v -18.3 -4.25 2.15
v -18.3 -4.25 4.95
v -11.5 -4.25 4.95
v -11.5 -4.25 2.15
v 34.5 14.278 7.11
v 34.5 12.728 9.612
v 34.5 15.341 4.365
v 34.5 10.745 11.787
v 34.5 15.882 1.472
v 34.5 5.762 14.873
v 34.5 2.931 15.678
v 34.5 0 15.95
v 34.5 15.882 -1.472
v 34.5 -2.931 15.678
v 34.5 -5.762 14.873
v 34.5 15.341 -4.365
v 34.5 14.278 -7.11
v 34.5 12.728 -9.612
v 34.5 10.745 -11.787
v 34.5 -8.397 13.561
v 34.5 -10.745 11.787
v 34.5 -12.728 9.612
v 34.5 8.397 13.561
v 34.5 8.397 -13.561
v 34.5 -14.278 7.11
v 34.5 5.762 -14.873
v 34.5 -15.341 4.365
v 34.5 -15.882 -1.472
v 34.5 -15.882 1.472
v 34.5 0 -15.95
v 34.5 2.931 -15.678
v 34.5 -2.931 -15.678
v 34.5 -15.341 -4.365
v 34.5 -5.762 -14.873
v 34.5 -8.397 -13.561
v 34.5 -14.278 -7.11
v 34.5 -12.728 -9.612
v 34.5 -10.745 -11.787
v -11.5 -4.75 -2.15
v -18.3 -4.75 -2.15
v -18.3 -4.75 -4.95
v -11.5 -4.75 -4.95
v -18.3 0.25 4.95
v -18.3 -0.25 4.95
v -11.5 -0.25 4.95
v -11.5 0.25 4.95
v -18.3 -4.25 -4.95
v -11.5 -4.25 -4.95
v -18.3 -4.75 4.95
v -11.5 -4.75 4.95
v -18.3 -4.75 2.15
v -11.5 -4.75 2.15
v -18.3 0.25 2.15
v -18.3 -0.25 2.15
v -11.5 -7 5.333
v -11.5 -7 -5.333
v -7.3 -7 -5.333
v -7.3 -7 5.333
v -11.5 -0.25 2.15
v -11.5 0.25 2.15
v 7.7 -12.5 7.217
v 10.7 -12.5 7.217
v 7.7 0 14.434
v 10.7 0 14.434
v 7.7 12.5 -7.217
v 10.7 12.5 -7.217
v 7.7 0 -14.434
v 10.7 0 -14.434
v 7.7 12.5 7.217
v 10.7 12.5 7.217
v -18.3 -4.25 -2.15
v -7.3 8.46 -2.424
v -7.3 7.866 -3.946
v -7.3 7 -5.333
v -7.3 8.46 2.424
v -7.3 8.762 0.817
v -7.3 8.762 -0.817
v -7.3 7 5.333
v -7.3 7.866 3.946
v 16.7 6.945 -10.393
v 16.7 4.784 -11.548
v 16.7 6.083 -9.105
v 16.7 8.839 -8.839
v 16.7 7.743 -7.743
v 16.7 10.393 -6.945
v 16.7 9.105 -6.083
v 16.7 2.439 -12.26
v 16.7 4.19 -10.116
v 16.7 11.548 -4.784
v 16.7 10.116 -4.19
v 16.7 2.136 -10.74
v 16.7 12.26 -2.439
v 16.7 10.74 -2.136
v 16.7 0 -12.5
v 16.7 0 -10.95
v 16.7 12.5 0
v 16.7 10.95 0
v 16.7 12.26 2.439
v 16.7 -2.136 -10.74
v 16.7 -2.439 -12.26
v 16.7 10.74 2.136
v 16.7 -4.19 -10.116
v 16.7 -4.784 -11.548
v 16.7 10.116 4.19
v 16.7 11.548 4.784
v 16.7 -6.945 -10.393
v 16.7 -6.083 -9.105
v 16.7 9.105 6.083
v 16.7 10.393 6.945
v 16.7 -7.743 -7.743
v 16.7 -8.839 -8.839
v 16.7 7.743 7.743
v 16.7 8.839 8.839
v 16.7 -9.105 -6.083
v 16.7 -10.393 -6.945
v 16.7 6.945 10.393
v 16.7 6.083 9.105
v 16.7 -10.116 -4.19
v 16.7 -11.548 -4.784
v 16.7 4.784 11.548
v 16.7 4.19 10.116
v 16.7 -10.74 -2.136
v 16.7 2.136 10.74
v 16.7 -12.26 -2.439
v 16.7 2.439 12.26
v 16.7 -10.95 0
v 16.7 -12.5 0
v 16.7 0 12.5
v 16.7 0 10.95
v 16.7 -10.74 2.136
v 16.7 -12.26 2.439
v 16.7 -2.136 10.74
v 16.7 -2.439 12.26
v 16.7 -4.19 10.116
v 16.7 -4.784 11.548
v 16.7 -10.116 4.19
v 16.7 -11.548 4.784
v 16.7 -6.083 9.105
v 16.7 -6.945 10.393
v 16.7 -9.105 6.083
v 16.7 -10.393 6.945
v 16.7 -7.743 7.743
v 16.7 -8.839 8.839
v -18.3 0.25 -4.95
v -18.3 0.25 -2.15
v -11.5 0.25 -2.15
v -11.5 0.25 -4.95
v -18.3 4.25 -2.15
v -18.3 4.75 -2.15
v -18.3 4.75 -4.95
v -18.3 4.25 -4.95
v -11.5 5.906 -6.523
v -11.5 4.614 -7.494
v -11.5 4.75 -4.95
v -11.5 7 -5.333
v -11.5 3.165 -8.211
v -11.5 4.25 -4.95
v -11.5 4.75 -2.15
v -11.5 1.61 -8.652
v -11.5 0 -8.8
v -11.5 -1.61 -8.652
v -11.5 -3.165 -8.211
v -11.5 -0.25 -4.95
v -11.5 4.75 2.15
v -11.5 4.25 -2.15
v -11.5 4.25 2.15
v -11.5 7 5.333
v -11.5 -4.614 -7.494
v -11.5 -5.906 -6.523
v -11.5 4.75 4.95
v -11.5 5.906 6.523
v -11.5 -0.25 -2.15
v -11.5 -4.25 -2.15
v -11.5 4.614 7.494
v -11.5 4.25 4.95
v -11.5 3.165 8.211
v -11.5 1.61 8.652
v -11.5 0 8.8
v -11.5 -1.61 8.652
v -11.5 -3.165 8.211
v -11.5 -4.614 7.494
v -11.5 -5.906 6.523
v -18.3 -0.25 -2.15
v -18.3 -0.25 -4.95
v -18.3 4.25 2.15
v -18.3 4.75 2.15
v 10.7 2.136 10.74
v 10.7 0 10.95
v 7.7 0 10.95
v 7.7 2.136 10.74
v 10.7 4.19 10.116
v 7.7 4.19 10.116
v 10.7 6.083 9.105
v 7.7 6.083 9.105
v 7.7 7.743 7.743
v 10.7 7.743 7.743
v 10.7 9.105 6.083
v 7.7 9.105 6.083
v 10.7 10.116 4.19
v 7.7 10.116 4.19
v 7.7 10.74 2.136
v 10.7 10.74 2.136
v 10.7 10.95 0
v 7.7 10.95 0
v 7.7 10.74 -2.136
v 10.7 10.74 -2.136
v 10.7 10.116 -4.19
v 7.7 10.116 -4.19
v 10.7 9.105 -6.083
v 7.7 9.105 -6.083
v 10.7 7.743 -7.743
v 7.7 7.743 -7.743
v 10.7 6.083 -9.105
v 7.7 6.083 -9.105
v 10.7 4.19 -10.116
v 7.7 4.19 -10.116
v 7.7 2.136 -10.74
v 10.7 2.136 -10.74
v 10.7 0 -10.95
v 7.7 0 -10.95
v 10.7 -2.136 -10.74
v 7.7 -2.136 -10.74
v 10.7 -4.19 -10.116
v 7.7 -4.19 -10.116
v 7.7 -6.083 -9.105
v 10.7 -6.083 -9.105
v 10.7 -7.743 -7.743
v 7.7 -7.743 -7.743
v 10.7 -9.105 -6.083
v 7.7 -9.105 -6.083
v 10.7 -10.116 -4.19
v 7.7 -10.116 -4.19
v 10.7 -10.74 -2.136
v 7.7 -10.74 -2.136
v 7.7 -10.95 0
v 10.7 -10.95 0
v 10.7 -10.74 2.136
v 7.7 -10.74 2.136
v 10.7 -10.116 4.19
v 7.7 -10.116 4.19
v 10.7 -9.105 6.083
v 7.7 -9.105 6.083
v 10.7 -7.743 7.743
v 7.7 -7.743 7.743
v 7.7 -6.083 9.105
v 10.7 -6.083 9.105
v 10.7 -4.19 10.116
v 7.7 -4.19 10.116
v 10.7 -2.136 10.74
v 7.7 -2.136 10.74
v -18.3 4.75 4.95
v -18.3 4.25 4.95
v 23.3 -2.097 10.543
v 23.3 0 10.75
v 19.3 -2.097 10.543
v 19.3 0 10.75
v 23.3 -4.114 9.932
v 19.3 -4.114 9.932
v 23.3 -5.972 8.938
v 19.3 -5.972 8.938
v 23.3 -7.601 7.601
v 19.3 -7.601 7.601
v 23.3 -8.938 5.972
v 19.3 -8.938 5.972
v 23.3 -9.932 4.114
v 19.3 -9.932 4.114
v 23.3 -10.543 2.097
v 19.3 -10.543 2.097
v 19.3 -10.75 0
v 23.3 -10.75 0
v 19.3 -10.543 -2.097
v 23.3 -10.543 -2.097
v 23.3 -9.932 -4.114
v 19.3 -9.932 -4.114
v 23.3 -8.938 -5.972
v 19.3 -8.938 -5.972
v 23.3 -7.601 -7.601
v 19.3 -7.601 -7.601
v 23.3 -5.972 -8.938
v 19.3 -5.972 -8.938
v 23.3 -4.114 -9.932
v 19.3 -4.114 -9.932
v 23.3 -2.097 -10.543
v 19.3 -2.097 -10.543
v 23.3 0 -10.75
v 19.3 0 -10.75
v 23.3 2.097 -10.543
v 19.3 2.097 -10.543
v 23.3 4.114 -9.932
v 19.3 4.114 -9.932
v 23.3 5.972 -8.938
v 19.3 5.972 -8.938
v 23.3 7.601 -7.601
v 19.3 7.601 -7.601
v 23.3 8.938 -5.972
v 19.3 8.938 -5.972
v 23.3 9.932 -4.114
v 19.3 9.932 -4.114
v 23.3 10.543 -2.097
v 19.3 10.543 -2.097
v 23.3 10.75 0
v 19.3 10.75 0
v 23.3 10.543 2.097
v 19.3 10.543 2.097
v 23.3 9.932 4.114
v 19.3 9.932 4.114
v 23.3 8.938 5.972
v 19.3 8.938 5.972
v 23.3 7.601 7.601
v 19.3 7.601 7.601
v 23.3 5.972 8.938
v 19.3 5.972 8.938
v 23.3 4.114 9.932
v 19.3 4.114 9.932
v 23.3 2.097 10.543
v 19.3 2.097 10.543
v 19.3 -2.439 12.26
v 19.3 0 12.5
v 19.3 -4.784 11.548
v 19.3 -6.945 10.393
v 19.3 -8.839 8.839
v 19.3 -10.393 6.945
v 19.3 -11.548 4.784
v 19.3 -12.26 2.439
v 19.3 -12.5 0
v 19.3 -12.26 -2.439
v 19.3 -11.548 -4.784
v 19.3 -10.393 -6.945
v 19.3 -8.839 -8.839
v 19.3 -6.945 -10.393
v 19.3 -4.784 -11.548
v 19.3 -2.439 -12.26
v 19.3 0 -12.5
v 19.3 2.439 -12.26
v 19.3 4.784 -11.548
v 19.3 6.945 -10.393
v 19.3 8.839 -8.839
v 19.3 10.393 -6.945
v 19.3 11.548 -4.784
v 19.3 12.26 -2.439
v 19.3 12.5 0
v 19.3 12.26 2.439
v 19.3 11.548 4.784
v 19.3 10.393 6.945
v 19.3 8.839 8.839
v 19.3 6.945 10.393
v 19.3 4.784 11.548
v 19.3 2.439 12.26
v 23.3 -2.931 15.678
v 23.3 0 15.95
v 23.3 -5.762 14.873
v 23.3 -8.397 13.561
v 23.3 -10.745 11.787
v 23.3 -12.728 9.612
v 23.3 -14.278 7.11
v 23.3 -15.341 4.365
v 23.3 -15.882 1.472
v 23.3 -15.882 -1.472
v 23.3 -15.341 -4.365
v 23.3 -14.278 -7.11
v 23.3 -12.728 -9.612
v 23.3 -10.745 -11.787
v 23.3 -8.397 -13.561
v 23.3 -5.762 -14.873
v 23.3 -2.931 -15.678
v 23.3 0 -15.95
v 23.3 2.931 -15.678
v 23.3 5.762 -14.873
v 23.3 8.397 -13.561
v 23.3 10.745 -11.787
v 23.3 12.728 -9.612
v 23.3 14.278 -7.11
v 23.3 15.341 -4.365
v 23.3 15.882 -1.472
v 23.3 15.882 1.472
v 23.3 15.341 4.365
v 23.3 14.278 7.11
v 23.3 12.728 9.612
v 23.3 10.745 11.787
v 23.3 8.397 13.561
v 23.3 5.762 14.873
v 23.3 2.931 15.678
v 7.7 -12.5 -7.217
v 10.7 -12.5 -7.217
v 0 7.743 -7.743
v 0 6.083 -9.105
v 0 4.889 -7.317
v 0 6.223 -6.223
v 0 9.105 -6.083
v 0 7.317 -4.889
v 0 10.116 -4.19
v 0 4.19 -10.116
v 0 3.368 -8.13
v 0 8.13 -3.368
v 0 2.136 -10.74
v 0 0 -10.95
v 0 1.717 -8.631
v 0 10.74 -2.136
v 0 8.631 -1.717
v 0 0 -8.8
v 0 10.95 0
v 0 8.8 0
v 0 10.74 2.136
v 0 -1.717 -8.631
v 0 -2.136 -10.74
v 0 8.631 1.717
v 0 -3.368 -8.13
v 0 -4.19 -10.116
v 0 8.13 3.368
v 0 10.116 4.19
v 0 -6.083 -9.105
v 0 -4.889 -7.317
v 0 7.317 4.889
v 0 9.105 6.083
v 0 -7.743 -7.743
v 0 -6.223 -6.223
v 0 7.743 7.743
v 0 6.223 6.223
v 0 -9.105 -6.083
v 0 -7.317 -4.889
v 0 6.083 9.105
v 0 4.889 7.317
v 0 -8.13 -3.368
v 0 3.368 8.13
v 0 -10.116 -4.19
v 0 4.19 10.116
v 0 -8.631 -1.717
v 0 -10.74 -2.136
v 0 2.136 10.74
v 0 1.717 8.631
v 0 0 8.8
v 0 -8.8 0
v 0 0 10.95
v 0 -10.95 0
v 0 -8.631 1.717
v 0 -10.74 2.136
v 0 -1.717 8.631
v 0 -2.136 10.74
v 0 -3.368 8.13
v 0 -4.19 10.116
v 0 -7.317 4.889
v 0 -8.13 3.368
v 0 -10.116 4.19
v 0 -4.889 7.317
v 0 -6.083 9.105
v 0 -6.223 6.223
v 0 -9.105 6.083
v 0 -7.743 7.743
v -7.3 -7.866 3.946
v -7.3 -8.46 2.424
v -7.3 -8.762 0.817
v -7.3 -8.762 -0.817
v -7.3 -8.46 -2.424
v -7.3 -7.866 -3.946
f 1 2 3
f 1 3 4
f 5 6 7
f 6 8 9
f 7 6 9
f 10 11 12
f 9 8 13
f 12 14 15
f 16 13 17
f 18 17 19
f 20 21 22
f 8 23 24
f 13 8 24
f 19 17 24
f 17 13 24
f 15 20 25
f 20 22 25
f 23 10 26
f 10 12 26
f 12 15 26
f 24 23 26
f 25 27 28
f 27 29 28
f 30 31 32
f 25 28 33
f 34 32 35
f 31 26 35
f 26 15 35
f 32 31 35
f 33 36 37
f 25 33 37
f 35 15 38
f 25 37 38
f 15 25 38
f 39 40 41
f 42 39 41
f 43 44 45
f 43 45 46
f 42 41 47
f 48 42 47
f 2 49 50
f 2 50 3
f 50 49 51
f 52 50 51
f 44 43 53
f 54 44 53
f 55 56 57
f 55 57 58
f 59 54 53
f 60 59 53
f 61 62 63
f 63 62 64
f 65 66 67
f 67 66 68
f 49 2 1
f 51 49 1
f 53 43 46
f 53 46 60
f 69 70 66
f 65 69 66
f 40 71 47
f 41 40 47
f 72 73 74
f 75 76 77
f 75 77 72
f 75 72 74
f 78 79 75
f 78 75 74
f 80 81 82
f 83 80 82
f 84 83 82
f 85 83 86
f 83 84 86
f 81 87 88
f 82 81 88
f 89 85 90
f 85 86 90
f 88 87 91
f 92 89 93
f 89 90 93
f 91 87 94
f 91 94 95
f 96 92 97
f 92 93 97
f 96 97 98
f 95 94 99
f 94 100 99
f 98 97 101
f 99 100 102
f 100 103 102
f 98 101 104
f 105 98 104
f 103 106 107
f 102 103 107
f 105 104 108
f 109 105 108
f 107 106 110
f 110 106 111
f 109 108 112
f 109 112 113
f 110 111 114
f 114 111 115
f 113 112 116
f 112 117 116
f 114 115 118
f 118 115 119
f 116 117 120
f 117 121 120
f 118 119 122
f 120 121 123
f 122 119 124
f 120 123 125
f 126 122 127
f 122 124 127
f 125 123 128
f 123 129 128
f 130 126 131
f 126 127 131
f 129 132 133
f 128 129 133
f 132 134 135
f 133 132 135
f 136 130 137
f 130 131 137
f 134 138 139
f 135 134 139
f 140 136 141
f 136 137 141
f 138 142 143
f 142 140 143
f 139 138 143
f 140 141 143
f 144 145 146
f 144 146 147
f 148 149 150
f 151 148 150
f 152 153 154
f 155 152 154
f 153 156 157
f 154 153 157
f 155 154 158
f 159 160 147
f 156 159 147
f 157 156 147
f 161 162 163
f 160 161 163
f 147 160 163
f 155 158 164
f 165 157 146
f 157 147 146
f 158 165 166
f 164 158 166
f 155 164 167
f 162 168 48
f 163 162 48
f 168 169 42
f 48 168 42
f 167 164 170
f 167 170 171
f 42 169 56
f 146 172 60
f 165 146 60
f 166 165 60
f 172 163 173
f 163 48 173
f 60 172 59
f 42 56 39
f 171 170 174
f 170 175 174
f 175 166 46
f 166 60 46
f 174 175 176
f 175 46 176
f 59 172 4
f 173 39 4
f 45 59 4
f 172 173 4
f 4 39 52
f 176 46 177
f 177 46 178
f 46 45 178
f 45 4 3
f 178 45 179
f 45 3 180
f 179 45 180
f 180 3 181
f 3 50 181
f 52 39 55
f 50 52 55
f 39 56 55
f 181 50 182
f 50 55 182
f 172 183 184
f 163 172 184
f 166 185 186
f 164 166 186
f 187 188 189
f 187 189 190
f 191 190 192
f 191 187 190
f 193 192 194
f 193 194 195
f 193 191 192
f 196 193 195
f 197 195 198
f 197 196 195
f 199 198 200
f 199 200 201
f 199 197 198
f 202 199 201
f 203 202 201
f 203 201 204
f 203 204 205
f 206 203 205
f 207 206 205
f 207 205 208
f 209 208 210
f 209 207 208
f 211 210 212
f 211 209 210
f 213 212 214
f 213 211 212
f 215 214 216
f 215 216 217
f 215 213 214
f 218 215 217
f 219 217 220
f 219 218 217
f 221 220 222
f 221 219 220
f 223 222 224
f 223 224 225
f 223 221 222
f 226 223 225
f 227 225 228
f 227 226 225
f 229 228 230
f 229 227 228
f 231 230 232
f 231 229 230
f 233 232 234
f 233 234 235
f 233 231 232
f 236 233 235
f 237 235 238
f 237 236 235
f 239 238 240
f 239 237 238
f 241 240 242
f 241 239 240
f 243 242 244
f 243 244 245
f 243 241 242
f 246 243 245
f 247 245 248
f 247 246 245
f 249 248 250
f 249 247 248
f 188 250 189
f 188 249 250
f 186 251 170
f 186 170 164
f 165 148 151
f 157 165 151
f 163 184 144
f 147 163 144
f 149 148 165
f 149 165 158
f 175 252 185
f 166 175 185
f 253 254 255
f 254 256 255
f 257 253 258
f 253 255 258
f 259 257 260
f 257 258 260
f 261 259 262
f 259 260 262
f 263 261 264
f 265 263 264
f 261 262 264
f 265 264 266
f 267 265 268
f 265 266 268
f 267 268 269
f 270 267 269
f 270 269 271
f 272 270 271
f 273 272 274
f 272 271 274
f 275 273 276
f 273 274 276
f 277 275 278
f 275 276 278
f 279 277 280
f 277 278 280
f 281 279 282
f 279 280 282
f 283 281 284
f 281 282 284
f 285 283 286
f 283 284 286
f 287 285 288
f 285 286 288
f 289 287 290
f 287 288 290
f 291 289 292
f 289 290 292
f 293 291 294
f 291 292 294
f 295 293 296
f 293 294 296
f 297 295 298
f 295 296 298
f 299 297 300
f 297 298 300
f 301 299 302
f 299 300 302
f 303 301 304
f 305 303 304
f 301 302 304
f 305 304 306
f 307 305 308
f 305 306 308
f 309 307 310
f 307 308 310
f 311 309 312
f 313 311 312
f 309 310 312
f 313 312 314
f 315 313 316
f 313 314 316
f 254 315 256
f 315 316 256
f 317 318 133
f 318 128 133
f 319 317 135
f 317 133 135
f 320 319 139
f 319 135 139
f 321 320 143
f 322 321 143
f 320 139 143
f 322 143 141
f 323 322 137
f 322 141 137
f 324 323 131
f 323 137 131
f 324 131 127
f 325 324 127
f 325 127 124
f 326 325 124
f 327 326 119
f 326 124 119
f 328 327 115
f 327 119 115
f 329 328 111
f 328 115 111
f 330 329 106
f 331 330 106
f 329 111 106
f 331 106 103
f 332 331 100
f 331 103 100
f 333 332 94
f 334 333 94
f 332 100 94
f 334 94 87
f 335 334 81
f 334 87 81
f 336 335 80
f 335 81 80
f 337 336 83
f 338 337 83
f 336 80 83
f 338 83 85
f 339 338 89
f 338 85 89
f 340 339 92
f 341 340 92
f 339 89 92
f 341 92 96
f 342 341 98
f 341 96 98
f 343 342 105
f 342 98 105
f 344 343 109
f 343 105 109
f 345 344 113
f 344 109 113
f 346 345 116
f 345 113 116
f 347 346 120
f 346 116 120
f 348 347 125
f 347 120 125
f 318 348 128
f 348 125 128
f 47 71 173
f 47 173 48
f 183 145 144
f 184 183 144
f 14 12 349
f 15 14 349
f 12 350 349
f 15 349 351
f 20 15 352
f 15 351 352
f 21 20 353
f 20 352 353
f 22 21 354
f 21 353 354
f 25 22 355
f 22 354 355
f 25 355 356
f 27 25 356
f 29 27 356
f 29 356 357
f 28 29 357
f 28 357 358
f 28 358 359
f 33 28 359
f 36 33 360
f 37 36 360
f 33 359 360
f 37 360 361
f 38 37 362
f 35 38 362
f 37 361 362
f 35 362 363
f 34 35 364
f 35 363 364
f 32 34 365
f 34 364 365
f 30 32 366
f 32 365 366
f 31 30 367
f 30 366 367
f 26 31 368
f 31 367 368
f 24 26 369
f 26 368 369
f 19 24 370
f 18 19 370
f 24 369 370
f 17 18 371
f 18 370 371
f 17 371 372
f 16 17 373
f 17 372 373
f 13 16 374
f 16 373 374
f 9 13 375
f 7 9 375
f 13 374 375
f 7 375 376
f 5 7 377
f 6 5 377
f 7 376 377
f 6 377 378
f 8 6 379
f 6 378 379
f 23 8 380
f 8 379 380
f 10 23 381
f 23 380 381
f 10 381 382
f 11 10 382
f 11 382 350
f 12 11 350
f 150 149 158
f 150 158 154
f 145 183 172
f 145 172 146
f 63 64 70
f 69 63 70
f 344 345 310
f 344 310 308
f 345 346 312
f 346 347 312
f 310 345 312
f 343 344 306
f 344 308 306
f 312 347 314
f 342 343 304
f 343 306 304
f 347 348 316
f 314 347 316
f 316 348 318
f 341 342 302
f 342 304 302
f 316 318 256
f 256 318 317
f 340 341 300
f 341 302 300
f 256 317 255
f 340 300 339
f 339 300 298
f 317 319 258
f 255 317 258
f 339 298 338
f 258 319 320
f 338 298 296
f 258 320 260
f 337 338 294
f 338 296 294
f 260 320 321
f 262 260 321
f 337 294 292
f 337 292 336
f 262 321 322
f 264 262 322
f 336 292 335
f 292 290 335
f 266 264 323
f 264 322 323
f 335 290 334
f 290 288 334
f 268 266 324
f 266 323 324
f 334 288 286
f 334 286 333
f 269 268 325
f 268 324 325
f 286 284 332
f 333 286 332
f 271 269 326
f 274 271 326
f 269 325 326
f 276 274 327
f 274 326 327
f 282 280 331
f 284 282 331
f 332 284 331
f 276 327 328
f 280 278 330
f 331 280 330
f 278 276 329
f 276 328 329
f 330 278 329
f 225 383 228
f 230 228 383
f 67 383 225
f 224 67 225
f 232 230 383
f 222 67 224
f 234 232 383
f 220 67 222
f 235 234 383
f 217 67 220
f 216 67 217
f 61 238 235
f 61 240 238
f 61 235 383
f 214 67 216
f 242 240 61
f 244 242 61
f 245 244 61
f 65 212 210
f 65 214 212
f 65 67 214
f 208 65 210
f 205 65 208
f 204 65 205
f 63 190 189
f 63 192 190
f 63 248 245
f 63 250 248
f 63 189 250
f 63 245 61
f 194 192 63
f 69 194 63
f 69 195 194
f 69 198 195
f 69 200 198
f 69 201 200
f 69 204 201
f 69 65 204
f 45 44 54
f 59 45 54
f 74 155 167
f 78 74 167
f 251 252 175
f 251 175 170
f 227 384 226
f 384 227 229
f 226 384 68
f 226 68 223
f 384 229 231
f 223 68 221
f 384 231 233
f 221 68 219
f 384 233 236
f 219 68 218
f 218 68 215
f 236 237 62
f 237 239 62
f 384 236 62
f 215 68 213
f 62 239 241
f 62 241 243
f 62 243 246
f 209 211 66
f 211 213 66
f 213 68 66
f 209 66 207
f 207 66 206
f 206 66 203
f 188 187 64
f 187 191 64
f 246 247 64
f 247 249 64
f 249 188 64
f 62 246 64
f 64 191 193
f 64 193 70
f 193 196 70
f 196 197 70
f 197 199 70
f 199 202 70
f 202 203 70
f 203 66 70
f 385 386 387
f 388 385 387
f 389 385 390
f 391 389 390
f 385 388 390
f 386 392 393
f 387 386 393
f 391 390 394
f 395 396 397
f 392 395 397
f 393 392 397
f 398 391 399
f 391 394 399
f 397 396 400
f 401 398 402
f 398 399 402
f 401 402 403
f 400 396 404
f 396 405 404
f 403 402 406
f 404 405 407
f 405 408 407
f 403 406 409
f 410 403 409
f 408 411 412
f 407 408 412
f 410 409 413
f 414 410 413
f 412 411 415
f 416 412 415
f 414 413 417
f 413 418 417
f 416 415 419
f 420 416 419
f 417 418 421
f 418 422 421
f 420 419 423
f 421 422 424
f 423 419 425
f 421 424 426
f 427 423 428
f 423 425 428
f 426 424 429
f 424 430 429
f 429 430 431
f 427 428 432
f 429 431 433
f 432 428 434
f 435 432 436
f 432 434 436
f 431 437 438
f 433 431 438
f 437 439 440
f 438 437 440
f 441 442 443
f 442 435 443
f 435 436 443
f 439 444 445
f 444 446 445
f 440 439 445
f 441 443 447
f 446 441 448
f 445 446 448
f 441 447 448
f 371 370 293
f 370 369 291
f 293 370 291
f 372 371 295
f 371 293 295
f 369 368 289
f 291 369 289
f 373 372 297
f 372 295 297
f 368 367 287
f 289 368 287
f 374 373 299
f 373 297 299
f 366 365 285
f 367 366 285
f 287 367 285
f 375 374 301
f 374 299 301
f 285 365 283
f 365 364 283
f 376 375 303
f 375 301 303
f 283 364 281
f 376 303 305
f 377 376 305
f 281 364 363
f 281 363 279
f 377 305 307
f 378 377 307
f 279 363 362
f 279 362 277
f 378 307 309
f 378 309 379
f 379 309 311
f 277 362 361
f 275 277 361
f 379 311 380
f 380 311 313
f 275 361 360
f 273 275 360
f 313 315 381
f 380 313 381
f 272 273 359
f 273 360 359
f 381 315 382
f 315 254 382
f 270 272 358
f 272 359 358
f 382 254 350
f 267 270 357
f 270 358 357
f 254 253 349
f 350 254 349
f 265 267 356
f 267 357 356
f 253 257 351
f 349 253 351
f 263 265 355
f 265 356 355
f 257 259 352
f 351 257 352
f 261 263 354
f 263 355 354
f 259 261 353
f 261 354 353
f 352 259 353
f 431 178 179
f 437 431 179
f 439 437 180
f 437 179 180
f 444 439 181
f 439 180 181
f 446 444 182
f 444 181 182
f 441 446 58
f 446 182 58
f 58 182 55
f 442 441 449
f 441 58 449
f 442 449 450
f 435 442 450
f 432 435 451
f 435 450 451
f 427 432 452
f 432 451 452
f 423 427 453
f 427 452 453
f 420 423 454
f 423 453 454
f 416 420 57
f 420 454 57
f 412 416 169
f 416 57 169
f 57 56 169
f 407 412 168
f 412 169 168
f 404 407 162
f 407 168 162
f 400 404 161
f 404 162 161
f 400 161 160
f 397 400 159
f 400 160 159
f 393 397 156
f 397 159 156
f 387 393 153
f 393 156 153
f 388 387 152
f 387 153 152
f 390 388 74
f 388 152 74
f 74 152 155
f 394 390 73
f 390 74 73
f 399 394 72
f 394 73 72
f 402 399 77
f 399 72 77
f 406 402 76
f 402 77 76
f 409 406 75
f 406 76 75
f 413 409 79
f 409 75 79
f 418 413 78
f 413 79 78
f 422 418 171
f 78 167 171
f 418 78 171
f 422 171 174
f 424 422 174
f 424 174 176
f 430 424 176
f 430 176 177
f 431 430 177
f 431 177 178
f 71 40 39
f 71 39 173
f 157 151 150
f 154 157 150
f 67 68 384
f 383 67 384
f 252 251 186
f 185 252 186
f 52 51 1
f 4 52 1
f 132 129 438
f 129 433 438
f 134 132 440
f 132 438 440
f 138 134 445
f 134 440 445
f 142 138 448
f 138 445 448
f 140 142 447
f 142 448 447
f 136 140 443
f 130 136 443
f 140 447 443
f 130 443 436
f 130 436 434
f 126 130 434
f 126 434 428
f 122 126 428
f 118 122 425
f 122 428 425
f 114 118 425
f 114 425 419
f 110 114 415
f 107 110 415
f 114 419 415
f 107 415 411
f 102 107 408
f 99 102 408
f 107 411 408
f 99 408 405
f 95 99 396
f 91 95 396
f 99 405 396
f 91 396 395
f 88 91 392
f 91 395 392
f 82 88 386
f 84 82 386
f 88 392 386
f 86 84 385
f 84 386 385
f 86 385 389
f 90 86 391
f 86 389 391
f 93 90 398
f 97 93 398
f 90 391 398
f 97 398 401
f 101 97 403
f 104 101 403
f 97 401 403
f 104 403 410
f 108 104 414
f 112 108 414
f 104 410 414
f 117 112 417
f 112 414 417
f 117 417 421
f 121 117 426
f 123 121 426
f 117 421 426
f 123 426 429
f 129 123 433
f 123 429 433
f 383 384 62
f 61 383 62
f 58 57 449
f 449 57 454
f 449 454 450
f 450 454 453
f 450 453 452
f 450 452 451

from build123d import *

# Parameters (mm, degrees)
ESQUISSE4_W             = 10.6658333
ESQUISSE4_H             = 2.673862607
ENL_V_MAT_EXTRU_1_DEPTH = 4.2
ESQUISSE3_W             = 2.8
ESQUISSE3_H             = 0.5
BOSS_EXTRU_1_DEPTH      = 6.8
BOSS_EXTRU_2_START      = 6
ESQUISSE5_R             = 10.95
BOSS_EXTRU_2_DEPTH      = 3


with BuildPart() as part:
    # Esquisse2 → Révolution1 (revolve)
    with BuildSketch(Plane.XY, mode=Mode.PRIVATE) as r_volution1_sk:
        Polygon((0, 10.95), (0, 8.8), (-11.5, 8.8), (-11.5, 0), (0, 0), (34.5, 0), (34.5, 15.95), (23.3, 15.95), (23.3, 10.75), (19.3, 10.75), (19.3, 12.5), (16.7, 12.5), (16.7, 10.95), align=None)
    revolve(r_volution1_sk.sketch.rotate(Axis((0, 0, 0), (1, 0, 0)), 90), axis=Axis((0, 0, 0), (1, 0, 0)))

    # Esquisse4 → Enlèv. mat.-Extru.1 (cut)
    with BuildSketch(Plane.ZY.offset(11.5)):
        with Locations((0, 8.336931304)):
            Rectangle(ESQUISSE4_W, ESQUISSE4_H)
        with Locations((0, -8.336931304)):
            Rectangle(ESQUISSE4_W, ESQUISSE4_H)
    extrude(amount=-ENL_V_MAT_EXTRU_1_DEPTH, mode=Mode.SUBTRACT)

    # Esquisse3 → Boss.-Extru.1 (add)
    with BuildSketch(Plane(origin=(-11.5, 0, 0), x_dir=(0, 0, -1), z_dir=(1, 0, 0))):
        with Locations((3.55, 4.5)):
            Rectangle(ESQUISSE3_W, ESQUISSE3_H)
        with Locations((3.55, 0)):
            Rectangle(ESQUISSE3_W, ESQUISSE3_H)
        with Locations((3.55, -4.5)):
            Rectangle(ESQUISSE3_W, ESQUISSE3_H)
        with Locations((-3.55, 0)):
            Rectangle(ESQUISSE3_W, ESQUISSE3_H)
        with Locations((-3.55, -4.5)):
            Rectangle(ESQUISSE3_W, ESQUISSE3_H)
        with Locations((-3.55, 4.5)):
            Rectangle(ESQUISSE3_W, ESQUISSE3_H)
    extrude(amount=-BOSS_EXTRU_1_DEPTH)


with BuildPart() as body_2:
    # Esquisse5 → Boss.-Extru.2 (new body)
    with BuildSketch(Plane.ZY.offset(-16.7).offset(BOSS_EXTRU_2_START)):
        Polygon((7.216878365, 12.5), (-7.216878365, 12.5), (-14.43375673, 0), (-7.216878365, -12.5), (7.216878365, -12.5), (14.43375673, 0), align=None)
        Circle(ESQUISSE5_R, mode=Mode.SUBTRACT)
    extrude(amount=BOSS_EXTRU_2_DEPTH)


solid = Compound([part.part, body_2.part])
